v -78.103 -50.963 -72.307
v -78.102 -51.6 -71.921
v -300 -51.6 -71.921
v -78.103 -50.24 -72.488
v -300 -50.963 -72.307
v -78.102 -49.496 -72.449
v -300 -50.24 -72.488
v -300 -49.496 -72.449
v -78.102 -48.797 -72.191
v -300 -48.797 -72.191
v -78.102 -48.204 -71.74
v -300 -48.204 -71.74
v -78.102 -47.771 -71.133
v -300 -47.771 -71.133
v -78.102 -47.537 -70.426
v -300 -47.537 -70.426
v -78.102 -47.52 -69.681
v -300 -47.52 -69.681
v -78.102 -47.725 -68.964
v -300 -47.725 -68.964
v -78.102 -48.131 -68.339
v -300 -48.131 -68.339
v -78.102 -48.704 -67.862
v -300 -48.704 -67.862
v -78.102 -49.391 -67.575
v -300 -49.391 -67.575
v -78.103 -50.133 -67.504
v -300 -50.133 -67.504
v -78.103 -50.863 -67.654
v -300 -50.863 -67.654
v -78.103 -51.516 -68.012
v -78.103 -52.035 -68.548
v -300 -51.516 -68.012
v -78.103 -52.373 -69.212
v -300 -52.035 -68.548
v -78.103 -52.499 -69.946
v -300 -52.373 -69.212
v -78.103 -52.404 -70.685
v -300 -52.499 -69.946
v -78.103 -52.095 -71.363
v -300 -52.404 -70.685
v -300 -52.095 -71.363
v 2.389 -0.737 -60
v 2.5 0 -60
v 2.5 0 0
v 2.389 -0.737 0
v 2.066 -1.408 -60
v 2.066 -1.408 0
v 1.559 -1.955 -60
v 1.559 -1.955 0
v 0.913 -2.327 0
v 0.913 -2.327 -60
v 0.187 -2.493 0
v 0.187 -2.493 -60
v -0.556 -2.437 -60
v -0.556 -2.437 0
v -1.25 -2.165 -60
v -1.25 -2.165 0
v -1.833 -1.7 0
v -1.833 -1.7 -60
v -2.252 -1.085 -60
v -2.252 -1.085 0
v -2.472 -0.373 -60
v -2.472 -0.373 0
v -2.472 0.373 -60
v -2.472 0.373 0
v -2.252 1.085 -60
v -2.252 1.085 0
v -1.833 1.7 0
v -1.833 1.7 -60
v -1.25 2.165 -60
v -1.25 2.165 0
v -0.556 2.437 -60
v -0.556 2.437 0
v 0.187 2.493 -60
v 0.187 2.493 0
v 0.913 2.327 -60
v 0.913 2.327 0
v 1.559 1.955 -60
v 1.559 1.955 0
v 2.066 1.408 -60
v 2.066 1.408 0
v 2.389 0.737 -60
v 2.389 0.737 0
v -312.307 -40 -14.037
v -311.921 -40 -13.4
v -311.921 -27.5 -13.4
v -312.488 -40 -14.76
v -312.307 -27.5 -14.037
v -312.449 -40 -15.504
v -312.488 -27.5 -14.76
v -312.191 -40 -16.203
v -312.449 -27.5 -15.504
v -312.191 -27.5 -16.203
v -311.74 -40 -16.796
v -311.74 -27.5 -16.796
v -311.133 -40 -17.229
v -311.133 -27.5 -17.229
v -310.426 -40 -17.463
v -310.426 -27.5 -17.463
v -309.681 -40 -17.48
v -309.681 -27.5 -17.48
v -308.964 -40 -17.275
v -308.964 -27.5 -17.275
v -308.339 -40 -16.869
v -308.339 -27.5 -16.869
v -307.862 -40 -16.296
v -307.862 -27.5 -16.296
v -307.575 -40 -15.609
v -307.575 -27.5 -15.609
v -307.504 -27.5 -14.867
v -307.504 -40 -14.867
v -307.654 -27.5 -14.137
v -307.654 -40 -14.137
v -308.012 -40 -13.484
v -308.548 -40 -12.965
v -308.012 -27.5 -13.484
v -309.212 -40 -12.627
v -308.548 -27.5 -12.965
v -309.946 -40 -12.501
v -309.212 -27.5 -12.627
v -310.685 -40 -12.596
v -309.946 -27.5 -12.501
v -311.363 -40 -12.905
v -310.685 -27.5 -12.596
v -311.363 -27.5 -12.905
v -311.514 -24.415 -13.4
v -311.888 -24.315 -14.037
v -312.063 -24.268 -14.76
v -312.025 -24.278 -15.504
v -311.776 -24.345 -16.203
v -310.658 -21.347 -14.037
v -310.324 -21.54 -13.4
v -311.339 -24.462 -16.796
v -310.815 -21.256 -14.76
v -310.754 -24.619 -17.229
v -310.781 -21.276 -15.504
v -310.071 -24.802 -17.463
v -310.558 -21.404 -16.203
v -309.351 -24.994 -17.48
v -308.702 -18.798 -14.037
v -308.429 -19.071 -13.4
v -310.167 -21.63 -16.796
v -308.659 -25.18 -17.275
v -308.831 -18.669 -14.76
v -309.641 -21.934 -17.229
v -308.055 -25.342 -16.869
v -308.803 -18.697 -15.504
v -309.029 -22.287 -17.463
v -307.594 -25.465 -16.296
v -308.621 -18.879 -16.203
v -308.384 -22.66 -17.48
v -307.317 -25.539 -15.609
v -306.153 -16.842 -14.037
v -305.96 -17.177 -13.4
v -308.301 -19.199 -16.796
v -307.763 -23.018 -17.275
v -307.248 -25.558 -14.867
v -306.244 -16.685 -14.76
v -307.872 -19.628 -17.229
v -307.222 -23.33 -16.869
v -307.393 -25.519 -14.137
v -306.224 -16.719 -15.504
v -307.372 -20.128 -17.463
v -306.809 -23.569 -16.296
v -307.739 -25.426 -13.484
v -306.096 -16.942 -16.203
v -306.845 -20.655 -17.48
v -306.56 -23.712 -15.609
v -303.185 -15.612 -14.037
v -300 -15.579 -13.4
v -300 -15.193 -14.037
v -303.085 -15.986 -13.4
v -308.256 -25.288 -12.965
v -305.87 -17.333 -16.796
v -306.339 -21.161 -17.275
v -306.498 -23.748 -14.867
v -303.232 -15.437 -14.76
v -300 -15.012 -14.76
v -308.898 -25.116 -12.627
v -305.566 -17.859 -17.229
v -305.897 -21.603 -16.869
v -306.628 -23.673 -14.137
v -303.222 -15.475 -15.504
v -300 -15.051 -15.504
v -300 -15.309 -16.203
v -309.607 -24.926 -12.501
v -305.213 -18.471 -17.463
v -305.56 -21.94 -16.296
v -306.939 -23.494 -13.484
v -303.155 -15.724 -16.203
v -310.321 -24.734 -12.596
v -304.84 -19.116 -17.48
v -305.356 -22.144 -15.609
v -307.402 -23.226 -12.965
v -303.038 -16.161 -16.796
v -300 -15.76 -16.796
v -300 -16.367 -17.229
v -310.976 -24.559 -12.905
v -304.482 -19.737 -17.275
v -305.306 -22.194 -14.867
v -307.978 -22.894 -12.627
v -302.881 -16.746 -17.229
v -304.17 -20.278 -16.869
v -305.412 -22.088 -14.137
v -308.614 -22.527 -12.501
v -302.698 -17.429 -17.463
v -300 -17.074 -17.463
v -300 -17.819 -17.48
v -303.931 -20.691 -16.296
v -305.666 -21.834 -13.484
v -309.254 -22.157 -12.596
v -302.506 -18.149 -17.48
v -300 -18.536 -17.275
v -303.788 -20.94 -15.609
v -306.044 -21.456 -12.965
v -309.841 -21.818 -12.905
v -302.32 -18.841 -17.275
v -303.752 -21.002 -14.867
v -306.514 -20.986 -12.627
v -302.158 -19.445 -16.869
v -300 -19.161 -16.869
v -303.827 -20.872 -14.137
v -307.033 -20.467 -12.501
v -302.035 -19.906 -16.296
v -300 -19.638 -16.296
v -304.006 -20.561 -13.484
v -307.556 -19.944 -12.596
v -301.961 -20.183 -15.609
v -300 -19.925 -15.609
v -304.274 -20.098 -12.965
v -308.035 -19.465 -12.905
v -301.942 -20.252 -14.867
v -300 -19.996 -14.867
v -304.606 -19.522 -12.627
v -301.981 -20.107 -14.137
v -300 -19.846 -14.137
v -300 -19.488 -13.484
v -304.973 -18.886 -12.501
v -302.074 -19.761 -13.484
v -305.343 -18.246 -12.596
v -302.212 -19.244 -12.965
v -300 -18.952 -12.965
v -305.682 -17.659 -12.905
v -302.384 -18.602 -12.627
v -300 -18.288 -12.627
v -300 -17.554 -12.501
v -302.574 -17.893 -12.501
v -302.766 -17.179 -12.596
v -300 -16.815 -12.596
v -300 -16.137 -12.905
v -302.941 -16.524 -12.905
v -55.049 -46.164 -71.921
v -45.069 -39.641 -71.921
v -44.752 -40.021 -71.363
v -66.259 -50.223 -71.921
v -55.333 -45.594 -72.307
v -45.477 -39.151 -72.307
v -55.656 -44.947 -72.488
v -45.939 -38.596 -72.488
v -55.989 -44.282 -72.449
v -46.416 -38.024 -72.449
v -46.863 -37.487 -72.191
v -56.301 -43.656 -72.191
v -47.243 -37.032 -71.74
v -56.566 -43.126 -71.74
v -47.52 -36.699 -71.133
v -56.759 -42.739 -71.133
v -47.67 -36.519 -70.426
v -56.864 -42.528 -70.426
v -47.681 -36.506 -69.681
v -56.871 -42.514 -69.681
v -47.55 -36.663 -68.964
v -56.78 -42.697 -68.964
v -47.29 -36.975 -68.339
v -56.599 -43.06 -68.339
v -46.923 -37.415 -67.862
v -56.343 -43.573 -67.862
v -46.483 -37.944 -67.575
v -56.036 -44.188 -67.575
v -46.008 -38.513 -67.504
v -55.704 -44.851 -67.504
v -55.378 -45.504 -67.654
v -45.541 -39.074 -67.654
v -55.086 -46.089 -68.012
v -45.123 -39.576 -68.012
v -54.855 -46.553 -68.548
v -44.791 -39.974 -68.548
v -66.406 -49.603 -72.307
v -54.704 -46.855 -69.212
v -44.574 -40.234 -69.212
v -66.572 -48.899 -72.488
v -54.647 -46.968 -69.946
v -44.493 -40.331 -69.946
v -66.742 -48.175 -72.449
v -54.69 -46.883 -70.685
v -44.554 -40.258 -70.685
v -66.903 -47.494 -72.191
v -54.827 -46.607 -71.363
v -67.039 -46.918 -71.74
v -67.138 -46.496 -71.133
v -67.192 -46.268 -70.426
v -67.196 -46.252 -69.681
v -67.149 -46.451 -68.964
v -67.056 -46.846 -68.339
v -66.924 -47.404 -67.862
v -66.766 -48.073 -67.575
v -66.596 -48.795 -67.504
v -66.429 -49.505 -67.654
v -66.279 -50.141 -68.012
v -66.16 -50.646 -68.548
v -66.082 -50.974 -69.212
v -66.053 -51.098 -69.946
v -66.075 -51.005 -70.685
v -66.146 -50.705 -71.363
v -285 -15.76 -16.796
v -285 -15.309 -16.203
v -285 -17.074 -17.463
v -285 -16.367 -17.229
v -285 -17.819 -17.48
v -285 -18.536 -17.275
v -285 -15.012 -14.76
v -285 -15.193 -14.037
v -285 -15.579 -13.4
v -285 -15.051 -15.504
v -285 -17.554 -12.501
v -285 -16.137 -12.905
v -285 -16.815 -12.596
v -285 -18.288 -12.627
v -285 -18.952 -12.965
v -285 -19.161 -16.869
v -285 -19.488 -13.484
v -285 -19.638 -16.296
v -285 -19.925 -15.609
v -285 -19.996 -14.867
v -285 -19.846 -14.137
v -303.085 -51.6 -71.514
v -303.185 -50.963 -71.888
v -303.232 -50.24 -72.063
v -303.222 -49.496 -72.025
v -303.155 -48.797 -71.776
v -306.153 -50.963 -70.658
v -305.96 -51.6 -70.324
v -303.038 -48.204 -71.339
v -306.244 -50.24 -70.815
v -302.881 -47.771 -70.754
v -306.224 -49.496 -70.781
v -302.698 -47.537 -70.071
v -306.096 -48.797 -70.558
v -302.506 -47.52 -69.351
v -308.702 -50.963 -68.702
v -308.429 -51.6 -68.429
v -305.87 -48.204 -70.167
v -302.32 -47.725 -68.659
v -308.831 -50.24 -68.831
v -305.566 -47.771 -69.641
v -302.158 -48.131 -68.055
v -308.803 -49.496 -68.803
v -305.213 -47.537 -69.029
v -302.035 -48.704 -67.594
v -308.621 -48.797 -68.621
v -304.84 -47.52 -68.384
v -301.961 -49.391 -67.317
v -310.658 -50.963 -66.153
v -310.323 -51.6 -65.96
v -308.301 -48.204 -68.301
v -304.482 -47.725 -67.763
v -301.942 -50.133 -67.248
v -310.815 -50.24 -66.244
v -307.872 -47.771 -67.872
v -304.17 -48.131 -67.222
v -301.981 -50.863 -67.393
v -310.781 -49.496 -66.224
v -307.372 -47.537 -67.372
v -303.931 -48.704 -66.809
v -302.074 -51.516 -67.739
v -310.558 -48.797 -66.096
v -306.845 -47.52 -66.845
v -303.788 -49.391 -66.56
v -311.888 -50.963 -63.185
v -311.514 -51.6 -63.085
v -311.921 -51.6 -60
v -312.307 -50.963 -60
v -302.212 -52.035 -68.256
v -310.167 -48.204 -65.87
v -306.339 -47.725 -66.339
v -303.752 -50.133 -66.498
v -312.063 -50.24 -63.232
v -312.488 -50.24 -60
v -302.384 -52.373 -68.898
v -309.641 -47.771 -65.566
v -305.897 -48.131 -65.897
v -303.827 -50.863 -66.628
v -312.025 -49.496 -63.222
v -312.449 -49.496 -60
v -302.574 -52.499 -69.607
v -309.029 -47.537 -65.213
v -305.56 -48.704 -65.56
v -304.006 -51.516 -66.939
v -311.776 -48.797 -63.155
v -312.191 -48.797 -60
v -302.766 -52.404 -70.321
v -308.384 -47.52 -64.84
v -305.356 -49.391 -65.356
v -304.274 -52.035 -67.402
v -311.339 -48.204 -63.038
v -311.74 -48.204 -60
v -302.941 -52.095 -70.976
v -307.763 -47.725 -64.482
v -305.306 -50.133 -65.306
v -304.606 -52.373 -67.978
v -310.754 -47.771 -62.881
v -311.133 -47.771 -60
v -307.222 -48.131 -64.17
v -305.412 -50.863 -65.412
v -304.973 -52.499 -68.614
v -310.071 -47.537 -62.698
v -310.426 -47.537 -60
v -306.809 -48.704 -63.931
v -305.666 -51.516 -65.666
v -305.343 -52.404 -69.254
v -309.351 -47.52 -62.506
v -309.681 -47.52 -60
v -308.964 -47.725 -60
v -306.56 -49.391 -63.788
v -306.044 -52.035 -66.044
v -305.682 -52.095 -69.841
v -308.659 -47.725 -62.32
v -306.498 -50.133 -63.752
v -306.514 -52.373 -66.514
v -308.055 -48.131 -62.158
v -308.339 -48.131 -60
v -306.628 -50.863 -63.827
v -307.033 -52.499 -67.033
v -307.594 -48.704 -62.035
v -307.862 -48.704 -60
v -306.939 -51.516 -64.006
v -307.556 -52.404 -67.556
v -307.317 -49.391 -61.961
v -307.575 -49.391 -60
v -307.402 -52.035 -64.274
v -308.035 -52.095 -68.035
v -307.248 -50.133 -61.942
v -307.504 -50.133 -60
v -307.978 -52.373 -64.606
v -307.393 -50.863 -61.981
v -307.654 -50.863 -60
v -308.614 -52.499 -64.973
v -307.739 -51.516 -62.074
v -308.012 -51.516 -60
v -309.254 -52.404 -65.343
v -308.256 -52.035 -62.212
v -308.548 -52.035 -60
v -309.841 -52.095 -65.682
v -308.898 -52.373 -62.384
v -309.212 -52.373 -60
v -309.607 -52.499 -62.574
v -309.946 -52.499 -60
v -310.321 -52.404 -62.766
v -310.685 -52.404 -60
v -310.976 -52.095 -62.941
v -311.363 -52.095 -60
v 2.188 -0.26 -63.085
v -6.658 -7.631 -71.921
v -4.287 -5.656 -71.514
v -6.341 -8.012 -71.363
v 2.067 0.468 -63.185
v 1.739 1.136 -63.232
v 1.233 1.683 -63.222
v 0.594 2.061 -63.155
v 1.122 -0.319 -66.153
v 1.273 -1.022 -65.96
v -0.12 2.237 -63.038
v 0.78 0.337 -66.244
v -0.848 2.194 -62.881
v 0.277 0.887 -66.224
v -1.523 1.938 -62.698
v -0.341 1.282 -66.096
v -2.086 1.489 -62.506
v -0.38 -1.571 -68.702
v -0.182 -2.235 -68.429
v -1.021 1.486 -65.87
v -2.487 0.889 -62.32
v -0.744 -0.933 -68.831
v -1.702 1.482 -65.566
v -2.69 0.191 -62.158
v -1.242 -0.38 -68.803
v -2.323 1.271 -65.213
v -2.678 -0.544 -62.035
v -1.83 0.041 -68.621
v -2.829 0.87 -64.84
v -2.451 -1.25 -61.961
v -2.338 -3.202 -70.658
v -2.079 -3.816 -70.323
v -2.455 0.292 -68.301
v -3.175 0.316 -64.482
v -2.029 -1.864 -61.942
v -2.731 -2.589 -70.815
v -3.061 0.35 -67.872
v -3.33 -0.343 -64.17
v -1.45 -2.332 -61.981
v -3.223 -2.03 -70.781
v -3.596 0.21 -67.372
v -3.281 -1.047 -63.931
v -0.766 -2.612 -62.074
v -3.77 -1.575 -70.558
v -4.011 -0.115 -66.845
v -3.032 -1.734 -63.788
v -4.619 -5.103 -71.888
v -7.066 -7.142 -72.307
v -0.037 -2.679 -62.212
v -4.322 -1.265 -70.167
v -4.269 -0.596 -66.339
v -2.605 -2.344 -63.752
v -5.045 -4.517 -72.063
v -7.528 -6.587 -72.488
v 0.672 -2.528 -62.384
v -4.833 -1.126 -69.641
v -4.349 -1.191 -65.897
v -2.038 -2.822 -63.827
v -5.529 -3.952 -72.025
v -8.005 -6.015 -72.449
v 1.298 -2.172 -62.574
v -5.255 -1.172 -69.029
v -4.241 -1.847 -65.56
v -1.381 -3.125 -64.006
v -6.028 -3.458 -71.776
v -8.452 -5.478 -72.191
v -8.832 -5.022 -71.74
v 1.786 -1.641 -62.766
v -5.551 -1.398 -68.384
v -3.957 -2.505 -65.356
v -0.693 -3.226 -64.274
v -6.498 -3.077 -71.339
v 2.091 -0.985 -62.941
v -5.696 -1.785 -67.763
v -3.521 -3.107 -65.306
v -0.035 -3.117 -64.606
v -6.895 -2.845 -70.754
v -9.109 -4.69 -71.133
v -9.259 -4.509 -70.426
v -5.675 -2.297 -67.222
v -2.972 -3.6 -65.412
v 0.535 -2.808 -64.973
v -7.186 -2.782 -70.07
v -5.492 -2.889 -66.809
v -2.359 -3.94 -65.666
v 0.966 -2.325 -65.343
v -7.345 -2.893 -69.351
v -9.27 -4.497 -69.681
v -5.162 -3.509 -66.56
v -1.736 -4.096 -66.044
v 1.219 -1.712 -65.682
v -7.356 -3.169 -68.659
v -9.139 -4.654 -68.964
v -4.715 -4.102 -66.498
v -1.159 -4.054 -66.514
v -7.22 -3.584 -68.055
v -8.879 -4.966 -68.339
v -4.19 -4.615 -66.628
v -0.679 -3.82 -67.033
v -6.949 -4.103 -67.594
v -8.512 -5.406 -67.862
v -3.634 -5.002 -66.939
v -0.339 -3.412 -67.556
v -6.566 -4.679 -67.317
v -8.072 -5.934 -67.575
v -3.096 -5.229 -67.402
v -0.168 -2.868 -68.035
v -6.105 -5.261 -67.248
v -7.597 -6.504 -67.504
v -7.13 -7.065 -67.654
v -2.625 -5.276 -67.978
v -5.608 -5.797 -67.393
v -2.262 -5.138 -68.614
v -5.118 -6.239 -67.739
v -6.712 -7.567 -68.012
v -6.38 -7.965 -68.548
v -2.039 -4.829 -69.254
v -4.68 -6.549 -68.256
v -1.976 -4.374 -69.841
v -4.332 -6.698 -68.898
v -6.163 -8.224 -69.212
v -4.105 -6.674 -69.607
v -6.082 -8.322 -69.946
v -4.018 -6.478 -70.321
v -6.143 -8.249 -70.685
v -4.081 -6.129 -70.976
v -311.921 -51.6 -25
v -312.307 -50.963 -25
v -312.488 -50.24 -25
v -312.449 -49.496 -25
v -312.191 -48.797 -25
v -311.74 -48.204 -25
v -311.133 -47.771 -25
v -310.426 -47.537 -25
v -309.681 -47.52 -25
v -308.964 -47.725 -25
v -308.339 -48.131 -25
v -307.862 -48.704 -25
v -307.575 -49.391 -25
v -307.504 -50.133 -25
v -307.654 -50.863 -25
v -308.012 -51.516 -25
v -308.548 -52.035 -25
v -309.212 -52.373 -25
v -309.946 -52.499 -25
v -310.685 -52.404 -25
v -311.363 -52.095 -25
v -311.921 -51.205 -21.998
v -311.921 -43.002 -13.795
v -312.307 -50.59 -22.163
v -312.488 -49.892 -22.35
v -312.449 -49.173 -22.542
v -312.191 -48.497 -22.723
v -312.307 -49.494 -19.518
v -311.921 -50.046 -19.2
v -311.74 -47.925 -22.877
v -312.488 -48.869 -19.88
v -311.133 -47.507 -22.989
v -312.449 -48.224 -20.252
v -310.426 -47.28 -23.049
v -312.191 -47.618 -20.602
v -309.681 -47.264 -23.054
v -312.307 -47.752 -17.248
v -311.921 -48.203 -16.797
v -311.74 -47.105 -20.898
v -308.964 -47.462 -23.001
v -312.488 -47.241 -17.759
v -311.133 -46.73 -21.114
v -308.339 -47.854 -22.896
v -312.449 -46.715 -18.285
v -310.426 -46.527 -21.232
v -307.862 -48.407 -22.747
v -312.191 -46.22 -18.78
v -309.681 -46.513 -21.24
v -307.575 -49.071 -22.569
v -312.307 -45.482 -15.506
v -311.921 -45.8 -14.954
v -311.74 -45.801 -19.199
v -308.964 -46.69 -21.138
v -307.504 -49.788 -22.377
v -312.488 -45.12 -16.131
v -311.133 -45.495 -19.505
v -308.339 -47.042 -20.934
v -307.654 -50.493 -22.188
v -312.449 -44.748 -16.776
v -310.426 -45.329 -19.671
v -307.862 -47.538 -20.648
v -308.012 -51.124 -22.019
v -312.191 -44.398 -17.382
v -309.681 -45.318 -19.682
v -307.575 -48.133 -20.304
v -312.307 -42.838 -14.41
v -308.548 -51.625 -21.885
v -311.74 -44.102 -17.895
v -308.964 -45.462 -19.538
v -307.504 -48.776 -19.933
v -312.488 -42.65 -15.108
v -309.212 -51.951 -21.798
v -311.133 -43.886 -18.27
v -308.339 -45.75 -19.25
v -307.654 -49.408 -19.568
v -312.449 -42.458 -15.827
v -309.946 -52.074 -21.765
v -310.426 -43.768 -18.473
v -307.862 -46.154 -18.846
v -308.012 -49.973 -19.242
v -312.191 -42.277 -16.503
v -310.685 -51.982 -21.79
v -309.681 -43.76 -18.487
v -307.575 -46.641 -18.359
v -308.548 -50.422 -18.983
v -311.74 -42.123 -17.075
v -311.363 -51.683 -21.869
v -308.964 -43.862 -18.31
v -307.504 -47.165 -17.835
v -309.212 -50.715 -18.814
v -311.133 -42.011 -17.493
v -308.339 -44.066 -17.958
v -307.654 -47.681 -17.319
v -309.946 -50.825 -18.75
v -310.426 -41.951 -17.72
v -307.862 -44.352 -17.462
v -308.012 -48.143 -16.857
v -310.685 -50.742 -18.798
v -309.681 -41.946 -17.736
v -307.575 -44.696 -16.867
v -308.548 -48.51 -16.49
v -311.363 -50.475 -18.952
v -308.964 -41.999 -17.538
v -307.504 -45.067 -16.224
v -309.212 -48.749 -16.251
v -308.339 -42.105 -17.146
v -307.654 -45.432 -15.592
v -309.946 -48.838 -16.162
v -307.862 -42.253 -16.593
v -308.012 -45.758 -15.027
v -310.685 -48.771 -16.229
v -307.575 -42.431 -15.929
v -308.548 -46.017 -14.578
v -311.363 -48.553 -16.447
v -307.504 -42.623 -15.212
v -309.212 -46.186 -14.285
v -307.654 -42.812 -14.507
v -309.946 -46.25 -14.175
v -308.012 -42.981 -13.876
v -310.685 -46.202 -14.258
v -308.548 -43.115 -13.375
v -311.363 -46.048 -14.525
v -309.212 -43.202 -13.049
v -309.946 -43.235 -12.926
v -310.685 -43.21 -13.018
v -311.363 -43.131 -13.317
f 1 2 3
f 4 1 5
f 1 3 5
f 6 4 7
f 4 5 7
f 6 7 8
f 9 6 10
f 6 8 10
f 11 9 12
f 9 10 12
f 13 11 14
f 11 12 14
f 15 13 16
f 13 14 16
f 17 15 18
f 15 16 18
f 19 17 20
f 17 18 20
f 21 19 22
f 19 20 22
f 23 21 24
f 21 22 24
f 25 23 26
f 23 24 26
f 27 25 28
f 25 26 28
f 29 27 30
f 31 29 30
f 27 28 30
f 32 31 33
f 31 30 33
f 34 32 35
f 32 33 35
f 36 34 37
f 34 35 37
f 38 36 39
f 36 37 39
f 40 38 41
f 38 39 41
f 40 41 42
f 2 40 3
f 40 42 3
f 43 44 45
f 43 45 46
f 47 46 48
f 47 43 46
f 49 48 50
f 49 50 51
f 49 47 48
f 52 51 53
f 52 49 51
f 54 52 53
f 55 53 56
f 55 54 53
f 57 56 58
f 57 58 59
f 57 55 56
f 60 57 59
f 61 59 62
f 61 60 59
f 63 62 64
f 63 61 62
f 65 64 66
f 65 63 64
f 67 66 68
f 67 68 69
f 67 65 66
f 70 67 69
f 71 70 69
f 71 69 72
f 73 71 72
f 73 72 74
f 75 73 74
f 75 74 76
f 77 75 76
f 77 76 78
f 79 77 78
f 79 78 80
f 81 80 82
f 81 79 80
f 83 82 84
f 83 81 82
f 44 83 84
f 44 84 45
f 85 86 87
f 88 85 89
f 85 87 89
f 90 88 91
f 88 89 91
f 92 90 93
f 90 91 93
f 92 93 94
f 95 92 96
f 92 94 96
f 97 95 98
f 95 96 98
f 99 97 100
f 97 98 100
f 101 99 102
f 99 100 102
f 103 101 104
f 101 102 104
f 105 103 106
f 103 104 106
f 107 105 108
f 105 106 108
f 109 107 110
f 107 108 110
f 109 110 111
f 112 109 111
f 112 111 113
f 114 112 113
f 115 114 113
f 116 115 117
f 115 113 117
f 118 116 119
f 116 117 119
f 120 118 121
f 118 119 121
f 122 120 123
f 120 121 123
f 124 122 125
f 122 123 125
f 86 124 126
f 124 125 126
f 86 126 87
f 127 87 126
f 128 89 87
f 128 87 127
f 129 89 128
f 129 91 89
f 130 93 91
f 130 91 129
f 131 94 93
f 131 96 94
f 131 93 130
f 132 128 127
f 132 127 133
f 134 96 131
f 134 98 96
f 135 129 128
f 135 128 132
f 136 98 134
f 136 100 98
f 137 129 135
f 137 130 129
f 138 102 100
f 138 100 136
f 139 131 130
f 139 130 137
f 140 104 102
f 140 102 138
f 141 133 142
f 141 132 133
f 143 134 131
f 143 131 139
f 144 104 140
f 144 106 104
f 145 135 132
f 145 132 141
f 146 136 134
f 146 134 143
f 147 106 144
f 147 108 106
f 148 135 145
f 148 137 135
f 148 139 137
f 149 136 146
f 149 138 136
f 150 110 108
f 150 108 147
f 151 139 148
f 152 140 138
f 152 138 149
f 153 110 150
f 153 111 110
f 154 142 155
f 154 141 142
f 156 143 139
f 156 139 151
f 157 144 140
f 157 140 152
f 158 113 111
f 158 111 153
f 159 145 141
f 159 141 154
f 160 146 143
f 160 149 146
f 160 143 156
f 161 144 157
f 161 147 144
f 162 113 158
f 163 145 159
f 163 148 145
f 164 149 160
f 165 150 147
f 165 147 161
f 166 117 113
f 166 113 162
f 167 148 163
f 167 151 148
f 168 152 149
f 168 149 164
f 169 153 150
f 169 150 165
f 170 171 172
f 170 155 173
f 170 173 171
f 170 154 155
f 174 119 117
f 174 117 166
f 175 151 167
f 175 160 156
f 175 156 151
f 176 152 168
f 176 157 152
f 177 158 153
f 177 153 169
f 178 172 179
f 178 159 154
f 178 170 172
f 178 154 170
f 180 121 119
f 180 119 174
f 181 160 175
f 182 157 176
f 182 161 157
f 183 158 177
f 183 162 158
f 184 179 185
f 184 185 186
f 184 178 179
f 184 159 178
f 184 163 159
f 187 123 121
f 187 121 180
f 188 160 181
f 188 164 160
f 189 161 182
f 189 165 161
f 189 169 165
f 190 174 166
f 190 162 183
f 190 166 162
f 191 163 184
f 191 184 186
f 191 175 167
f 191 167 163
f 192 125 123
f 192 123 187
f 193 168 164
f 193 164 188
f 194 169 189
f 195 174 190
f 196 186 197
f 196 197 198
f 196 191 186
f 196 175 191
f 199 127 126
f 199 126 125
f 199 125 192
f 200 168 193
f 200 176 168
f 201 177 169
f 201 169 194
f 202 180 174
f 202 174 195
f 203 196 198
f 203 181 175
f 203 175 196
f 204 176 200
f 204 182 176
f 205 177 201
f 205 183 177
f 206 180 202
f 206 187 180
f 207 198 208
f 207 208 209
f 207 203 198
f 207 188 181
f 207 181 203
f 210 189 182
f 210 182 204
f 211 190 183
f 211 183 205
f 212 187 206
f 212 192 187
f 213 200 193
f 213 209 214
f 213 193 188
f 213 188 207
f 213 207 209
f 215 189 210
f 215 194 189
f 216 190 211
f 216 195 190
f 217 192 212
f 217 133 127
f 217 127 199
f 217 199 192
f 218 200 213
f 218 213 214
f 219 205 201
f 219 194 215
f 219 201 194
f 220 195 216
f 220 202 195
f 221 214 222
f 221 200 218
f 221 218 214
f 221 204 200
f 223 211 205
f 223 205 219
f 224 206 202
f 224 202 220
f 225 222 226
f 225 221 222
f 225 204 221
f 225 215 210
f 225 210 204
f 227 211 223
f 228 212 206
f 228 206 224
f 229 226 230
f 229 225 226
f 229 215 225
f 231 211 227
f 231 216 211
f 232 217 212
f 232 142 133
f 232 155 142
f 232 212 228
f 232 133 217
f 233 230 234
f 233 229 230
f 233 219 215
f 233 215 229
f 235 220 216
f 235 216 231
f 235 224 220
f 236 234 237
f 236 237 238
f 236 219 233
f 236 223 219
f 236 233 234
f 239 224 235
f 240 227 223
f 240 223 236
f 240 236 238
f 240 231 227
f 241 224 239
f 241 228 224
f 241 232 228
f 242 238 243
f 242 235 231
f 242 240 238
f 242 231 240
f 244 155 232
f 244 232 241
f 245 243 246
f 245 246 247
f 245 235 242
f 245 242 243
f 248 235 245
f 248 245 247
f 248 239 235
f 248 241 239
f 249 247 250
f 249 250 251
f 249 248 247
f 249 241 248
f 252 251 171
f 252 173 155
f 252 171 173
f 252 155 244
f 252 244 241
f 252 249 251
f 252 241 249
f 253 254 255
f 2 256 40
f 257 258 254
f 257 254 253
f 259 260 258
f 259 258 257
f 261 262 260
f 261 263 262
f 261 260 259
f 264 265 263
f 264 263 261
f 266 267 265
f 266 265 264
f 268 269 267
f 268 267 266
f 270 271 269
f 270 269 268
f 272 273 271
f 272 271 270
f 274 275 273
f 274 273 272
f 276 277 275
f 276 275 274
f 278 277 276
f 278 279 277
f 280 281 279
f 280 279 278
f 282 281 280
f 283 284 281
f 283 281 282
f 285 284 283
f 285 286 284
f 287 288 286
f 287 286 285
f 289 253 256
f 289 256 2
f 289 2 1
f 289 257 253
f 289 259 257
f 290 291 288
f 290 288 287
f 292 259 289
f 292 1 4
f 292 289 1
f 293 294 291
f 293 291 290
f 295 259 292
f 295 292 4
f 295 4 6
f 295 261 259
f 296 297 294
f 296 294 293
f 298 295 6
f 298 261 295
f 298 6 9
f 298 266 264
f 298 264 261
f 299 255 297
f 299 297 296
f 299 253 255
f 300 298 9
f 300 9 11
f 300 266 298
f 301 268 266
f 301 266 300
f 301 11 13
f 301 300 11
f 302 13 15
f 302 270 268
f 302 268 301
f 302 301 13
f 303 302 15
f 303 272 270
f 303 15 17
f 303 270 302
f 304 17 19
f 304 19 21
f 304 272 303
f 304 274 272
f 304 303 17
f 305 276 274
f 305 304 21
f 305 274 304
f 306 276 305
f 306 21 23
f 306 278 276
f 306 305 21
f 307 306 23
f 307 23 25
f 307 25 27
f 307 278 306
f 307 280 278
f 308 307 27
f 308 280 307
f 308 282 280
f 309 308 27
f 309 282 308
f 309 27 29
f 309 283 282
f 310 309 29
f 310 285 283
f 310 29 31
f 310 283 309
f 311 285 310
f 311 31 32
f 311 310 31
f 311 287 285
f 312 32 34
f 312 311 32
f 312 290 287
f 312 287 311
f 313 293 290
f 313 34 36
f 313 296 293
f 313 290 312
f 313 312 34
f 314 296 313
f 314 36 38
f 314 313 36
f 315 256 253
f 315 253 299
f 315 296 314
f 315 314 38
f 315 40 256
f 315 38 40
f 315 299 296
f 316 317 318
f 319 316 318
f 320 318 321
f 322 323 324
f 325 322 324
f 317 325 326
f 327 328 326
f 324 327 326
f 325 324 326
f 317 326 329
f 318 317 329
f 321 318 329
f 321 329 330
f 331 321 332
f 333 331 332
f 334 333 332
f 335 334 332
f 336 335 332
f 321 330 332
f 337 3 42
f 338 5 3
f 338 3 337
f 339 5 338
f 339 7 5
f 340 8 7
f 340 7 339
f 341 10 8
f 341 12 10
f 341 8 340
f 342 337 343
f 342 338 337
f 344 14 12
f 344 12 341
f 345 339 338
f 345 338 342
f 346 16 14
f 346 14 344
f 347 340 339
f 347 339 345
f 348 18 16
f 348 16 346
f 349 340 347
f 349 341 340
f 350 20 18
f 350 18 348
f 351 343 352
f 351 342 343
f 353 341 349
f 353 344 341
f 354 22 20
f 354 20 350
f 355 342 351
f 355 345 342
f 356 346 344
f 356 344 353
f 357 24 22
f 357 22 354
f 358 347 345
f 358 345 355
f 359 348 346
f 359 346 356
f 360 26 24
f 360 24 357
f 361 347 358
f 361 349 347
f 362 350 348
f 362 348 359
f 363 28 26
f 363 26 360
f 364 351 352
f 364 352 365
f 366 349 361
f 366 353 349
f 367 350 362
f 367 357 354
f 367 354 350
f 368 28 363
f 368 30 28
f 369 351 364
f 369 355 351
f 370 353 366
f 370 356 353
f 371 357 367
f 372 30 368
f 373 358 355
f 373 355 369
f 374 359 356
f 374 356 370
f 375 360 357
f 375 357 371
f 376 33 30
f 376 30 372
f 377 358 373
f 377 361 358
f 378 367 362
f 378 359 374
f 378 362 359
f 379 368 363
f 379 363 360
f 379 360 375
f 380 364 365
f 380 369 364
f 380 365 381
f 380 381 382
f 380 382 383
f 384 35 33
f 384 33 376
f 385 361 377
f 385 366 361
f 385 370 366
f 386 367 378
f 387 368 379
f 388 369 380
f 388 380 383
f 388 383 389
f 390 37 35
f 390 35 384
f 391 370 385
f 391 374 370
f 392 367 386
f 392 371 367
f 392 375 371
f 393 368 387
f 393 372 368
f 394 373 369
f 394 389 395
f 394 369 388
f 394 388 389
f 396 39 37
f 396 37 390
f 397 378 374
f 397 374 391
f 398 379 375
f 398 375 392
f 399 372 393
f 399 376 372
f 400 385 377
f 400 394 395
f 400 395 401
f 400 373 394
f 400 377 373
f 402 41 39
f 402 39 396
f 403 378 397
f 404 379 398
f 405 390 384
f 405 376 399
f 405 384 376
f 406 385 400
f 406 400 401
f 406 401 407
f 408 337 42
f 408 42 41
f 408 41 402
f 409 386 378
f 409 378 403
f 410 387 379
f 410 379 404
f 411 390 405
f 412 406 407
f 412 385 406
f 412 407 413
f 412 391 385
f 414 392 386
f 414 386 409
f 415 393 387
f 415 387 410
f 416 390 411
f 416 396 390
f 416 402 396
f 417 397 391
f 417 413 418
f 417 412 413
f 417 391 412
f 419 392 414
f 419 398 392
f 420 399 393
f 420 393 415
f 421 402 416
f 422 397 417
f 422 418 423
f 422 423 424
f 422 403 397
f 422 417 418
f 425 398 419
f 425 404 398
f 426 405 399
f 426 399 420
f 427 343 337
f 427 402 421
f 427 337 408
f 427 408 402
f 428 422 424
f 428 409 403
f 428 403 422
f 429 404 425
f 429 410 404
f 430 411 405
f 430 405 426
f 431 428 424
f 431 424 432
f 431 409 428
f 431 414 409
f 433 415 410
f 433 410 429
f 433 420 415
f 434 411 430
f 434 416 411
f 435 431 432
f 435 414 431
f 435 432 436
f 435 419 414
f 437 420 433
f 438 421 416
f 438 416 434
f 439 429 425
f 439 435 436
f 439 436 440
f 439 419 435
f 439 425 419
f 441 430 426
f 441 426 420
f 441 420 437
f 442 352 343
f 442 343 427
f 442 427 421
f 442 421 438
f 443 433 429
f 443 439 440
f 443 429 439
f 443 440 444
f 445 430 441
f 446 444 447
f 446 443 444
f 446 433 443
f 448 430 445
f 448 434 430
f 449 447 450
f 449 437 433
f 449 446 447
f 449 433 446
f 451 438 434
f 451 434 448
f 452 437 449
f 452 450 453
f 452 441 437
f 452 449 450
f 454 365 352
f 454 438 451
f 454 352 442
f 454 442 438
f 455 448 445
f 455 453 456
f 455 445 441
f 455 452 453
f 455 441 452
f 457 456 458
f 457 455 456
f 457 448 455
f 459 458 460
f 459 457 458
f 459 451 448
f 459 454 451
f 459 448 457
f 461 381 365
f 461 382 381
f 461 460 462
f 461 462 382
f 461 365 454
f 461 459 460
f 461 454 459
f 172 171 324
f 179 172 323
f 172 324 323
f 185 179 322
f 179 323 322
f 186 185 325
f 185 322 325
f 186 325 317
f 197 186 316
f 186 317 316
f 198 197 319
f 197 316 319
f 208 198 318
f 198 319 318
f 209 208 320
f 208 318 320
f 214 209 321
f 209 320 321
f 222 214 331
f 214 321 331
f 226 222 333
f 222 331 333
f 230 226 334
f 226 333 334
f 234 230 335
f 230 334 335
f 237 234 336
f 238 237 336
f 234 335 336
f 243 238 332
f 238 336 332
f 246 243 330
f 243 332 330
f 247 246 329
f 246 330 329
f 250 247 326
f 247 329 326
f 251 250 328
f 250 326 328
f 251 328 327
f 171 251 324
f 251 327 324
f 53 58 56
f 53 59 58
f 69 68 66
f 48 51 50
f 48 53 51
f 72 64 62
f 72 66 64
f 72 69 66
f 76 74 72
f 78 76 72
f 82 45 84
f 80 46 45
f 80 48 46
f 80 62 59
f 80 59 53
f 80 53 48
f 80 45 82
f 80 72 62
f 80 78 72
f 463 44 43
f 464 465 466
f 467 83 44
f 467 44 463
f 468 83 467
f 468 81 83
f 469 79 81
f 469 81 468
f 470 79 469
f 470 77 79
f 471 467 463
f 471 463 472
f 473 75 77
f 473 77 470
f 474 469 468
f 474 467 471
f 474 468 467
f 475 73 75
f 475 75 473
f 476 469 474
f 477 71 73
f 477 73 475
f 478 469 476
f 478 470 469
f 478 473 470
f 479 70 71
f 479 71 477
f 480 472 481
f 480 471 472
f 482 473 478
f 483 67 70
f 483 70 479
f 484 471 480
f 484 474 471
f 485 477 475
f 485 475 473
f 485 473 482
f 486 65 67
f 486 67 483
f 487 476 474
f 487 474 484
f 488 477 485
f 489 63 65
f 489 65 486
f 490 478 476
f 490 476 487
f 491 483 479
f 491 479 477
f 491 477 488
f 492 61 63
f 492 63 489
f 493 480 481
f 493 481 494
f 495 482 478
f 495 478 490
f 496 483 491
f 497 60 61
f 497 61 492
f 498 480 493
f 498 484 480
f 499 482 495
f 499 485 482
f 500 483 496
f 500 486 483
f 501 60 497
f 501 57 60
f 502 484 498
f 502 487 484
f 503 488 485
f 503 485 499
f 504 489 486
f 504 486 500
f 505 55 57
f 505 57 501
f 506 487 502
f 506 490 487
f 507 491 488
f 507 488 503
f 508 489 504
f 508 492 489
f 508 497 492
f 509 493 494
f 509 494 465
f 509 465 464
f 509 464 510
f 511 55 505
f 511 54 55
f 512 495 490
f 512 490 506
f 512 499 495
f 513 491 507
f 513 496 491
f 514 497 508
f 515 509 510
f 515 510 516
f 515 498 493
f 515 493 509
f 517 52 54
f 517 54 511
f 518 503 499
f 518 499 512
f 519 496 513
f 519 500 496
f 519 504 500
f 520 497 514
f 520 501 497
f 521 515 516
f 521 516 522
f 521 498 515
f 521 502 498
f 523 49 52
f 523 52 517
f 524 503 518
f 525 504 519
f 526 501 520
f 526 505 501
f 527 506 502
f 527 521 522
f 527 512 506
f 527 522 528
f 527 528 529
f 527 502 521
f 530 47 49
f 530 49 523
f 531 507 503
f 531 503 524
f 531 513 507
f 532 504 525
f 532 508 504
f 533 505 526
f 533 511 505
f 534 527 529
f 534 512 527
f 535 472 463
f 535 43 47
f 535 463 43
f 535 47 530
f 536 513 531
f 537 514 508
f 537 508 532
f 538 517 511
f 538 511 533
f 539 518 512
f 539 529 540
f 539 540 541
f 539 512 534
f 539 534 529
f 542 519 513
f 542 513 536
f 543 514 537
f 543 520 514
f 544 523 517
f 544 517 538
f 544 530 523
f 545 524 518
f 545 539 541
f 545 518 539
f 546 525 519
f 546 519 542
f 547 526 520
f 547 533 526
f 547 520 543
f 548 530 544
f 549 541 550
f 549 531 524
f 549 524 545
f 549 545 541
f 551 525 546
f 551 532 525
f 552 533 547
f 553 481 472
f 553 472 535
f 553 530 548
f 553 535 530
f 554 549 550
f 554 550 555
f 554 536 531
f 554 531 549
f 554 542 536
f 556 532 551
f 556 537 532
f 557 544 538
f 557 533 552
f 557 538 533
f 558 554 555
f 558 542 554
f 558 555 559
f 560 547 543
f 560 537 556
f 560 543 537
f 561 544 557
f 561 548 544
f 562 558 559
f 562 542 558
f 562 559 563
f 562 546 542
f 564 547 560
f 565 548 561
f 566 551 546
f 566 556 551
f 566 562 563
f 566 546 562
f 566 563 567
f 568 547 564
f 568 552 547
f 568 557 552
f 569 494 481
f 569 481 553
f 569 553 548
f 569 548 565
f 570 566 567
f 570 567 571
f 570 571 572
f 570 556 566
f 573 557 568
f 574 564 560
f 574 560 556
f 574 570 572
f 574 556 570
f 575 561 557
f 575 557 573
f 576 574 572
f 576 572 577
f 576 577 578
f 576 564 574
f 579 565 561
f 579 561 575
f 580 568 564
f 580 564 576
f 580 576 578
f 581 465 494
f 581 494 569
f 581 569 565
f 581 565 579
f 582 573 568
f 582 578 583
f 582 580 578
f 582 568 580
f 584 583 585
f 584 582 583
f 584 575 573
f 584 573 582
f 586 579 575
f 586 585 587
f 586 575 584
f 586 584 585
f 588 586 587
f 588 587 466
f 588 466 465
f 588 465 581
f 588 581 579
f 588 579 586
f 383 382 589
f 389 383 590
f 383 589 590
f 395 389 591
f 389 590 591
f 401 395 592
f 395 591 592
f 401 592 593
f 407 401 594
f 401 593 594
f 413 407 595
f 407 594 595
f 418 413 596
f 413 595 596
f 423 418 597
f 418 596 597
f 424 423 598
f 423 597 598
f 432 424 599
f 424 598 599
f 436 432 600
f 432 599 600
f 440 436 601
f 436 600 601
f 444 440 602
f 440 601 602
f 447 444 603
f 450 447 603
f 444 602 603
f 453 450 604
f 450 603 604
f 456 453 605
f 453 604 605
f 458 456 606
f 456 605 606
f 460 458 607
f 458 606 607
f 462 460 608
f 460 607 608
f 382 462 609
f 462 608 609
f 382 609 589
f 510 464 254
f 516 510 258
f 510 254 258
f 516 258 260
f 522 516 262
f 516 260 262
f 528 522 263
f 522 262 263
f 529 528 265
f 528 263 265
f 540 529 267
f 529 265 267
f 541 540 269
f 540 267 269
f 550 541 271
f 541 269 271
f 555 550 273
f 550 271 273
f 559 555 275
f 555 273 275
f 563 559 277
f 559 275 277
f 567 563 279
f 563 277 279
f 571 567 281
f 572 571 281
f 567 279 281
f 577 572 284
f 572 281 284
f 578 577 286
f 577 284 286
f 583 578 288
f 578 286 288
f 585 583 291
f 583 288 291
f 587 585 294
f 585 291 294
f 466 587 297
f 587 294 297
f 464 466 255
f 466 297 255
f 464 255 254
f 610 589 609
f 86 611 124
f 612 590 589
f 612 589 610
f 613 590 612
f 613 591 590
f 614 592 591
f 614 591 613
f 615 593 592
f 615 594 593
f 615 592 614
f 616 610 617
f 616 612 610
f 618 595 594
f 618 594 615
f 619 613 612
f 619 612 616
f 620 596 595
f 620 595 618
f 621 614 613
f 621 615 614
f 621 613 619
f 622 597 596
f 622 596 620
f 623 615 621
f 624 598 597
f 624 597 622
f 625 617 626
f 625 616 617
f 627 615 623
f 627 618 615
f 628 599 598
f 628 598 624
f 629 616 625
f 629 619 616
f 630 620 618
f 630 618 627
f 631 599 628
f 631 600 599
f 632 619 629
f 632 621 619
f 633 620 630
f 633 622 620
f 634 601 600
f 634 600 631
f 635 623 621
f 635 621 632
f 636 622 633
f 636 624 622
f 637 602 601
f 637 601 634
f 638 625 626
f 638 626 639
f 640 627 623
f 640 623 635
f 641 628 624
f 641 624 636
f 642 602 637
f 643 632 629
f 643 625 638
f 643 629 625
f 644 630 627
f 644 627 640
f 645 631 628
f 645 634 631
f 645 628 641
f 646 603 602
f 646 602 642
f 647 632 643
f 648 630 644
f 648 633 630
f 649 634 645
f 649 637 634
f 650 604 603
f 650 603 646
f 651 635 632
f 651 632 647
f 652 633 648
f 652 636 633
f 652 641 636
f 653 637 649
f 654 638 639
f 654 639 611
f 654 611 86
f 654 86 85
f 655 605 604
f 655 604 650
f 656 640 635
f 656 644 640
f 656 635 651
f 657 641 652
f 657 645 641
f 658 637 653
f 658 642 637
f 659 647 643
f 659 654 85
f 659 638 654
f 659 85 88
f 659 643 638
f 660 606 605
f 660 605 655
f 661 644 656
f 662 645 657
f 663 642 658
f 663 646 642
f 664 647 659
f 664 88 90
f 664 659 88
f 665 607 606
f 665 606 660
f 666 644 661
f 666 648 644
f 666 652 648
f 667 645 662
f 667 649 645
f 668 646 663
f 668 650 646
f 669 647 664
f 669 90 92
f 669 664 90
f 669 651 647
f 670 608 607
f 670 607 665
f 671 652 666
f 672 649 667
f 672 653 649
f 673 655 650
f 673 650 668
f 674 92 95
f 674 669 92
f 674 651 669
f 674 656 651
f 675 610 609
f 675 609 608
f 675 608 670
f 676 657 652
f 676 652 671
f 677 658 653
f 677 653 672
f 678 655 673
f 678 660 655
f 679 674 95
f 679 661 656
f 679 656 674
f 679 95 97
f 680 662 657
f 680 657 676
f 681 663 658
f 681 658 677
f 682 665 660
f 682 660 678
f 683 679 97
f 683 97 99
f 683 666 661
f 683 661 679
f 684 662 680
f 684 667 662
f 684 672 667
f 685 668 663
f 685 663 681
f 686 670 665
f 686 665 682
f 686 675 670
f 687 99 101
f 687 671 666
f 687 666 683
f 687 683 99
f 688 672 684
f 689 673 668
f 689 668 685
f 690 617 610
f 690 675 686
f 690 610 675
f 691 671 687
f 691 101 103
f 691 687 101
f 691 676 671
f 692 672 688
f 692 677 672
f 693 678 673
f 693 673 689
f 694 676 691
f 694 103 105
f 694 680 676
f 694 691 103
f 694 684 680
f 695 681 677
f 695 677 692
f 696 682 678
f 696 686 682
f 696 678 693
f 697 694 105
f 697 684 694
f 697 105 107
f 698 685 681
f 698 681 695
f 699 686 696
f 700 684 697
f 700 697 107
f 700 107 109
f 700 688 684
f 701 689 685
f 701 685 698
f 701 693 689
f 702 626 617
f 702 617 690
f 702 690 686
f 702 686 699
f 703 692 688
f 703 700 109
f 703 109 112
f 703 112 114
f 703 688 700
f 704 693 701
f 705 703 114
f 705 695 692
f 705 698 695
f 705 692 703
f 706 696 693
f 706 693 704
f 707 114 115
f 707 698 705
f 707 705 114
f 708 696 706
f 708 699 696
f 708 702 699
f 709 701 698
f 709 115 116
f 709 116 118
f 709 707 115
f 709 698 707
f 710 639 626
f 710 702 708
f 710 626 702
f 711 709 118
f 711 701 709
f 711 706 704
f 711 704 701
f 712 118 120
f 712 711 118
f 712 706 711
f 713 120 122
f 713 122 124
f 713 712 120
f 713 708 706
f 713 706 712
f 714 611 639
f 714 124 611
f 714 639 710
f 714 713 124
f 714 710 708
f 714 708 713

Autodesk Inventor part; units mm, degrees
ref_plane "Work Plane1" through (0, 0, -70) normal (0, 0, 1) x (1, 0, 0)
ref_plane "Work Plane2" through (0, -50, 0) normal (0, 1, 0) x (-1, 0, 0)
ref_plane "Work Plane3" through (-310, 0, 0) normal (1, 0, 0) x (0, 1, 0)
sketch "Sketch2" plane through (0, 0, -70) normal (0, 0, 1) x (1, 0, 0)
  line L0 (0, 0) -> (-60, -50) construction
  line L1 (-60, -50) -> (-310, -50) construction
  line L2 (-310, 10) -> (-310, -60) construction
  dimension "d3" = 250
  dimension "d4" = 50
sketch "Sketch3" plane through (-310, 0, 0) normal (1, 0, 0) x (0, 1, 0)
  line L0 (-50, -70) -> (-50, -15) construction
  line L1 (-50, -15) -> (-17.5, -15) construction
  dimension "d5" = 55
  dimension "d6" = 32.5
ref_plane "Work Plane4" through (-310, -17.5, -15) normal (0, 1, 0) x (-1, 0, 0)
sketch "Sketch4" plane through (-310, -17.5, -15) normal (0, 1, 0) x (-1, 0, 0)
  line L0 (0, 0) -> (-25, 0) construction
  dimension "d7" = 25
sketch "Sketch5" plane through (0, 0, 0) normal (0, 0, 1) x (1, 0, 0)
  circle A0 centre (0, 0) radius 2.5
  dimension "d13" = 5
sketch3d "3D Sketch1"
  line L0 (0, 0, 0) -> (0, 0, -60)
  arc A0 (0, 0, -60) -> (-7.6822, -6.4018, -70) centre (-7.6822, -6.4018, -60) ccw
  line L1 (-7.6822, -6.4018, -70) -> (-46.0933, -38.4111, -70)
  arc A1 (-46.0933, -38.4111, -70) -> (-78.1025, -50, -70) centre (-78.1025, 0, -70) ccw
  line L2 (-78.1025, -50, -70) -> (-300, -50, -70)
  arc A2 (-300, -50, -70) -> (-310, -50, -60) centre (-300, -50, -60) ccw
  line L3 (-310, -50, -60) -> (-310, -50, -25)
  arc A3 (-310, -50, -25) -> (-310, -40, -15) centre (-310, -40, -25) ccw
  line L4 (-310, -40, -15) -> (-310, -27.5, -15)
  arc A4 (-310, -27.5, -15) -> (-300, -17.5, -15) centre (-300, -27.5, -15) ccw
  line L5 (-300, -17.5, -15) -> (-285, -17.5, -15)
  dimension "d8" = 10
  dimension "d9" = 10
  dimension "d10" = 10
  dimension "d11" = 10
  dimension "d12" = 50
sweep "Sweep1" add profiles "Sketch5" path "3D Sketch1"
equation "\"d9\" = d8"
equation "\"d10\" = d8"
equation "\"d11\" = d8"
properties part number "314-15" material "Steel"
